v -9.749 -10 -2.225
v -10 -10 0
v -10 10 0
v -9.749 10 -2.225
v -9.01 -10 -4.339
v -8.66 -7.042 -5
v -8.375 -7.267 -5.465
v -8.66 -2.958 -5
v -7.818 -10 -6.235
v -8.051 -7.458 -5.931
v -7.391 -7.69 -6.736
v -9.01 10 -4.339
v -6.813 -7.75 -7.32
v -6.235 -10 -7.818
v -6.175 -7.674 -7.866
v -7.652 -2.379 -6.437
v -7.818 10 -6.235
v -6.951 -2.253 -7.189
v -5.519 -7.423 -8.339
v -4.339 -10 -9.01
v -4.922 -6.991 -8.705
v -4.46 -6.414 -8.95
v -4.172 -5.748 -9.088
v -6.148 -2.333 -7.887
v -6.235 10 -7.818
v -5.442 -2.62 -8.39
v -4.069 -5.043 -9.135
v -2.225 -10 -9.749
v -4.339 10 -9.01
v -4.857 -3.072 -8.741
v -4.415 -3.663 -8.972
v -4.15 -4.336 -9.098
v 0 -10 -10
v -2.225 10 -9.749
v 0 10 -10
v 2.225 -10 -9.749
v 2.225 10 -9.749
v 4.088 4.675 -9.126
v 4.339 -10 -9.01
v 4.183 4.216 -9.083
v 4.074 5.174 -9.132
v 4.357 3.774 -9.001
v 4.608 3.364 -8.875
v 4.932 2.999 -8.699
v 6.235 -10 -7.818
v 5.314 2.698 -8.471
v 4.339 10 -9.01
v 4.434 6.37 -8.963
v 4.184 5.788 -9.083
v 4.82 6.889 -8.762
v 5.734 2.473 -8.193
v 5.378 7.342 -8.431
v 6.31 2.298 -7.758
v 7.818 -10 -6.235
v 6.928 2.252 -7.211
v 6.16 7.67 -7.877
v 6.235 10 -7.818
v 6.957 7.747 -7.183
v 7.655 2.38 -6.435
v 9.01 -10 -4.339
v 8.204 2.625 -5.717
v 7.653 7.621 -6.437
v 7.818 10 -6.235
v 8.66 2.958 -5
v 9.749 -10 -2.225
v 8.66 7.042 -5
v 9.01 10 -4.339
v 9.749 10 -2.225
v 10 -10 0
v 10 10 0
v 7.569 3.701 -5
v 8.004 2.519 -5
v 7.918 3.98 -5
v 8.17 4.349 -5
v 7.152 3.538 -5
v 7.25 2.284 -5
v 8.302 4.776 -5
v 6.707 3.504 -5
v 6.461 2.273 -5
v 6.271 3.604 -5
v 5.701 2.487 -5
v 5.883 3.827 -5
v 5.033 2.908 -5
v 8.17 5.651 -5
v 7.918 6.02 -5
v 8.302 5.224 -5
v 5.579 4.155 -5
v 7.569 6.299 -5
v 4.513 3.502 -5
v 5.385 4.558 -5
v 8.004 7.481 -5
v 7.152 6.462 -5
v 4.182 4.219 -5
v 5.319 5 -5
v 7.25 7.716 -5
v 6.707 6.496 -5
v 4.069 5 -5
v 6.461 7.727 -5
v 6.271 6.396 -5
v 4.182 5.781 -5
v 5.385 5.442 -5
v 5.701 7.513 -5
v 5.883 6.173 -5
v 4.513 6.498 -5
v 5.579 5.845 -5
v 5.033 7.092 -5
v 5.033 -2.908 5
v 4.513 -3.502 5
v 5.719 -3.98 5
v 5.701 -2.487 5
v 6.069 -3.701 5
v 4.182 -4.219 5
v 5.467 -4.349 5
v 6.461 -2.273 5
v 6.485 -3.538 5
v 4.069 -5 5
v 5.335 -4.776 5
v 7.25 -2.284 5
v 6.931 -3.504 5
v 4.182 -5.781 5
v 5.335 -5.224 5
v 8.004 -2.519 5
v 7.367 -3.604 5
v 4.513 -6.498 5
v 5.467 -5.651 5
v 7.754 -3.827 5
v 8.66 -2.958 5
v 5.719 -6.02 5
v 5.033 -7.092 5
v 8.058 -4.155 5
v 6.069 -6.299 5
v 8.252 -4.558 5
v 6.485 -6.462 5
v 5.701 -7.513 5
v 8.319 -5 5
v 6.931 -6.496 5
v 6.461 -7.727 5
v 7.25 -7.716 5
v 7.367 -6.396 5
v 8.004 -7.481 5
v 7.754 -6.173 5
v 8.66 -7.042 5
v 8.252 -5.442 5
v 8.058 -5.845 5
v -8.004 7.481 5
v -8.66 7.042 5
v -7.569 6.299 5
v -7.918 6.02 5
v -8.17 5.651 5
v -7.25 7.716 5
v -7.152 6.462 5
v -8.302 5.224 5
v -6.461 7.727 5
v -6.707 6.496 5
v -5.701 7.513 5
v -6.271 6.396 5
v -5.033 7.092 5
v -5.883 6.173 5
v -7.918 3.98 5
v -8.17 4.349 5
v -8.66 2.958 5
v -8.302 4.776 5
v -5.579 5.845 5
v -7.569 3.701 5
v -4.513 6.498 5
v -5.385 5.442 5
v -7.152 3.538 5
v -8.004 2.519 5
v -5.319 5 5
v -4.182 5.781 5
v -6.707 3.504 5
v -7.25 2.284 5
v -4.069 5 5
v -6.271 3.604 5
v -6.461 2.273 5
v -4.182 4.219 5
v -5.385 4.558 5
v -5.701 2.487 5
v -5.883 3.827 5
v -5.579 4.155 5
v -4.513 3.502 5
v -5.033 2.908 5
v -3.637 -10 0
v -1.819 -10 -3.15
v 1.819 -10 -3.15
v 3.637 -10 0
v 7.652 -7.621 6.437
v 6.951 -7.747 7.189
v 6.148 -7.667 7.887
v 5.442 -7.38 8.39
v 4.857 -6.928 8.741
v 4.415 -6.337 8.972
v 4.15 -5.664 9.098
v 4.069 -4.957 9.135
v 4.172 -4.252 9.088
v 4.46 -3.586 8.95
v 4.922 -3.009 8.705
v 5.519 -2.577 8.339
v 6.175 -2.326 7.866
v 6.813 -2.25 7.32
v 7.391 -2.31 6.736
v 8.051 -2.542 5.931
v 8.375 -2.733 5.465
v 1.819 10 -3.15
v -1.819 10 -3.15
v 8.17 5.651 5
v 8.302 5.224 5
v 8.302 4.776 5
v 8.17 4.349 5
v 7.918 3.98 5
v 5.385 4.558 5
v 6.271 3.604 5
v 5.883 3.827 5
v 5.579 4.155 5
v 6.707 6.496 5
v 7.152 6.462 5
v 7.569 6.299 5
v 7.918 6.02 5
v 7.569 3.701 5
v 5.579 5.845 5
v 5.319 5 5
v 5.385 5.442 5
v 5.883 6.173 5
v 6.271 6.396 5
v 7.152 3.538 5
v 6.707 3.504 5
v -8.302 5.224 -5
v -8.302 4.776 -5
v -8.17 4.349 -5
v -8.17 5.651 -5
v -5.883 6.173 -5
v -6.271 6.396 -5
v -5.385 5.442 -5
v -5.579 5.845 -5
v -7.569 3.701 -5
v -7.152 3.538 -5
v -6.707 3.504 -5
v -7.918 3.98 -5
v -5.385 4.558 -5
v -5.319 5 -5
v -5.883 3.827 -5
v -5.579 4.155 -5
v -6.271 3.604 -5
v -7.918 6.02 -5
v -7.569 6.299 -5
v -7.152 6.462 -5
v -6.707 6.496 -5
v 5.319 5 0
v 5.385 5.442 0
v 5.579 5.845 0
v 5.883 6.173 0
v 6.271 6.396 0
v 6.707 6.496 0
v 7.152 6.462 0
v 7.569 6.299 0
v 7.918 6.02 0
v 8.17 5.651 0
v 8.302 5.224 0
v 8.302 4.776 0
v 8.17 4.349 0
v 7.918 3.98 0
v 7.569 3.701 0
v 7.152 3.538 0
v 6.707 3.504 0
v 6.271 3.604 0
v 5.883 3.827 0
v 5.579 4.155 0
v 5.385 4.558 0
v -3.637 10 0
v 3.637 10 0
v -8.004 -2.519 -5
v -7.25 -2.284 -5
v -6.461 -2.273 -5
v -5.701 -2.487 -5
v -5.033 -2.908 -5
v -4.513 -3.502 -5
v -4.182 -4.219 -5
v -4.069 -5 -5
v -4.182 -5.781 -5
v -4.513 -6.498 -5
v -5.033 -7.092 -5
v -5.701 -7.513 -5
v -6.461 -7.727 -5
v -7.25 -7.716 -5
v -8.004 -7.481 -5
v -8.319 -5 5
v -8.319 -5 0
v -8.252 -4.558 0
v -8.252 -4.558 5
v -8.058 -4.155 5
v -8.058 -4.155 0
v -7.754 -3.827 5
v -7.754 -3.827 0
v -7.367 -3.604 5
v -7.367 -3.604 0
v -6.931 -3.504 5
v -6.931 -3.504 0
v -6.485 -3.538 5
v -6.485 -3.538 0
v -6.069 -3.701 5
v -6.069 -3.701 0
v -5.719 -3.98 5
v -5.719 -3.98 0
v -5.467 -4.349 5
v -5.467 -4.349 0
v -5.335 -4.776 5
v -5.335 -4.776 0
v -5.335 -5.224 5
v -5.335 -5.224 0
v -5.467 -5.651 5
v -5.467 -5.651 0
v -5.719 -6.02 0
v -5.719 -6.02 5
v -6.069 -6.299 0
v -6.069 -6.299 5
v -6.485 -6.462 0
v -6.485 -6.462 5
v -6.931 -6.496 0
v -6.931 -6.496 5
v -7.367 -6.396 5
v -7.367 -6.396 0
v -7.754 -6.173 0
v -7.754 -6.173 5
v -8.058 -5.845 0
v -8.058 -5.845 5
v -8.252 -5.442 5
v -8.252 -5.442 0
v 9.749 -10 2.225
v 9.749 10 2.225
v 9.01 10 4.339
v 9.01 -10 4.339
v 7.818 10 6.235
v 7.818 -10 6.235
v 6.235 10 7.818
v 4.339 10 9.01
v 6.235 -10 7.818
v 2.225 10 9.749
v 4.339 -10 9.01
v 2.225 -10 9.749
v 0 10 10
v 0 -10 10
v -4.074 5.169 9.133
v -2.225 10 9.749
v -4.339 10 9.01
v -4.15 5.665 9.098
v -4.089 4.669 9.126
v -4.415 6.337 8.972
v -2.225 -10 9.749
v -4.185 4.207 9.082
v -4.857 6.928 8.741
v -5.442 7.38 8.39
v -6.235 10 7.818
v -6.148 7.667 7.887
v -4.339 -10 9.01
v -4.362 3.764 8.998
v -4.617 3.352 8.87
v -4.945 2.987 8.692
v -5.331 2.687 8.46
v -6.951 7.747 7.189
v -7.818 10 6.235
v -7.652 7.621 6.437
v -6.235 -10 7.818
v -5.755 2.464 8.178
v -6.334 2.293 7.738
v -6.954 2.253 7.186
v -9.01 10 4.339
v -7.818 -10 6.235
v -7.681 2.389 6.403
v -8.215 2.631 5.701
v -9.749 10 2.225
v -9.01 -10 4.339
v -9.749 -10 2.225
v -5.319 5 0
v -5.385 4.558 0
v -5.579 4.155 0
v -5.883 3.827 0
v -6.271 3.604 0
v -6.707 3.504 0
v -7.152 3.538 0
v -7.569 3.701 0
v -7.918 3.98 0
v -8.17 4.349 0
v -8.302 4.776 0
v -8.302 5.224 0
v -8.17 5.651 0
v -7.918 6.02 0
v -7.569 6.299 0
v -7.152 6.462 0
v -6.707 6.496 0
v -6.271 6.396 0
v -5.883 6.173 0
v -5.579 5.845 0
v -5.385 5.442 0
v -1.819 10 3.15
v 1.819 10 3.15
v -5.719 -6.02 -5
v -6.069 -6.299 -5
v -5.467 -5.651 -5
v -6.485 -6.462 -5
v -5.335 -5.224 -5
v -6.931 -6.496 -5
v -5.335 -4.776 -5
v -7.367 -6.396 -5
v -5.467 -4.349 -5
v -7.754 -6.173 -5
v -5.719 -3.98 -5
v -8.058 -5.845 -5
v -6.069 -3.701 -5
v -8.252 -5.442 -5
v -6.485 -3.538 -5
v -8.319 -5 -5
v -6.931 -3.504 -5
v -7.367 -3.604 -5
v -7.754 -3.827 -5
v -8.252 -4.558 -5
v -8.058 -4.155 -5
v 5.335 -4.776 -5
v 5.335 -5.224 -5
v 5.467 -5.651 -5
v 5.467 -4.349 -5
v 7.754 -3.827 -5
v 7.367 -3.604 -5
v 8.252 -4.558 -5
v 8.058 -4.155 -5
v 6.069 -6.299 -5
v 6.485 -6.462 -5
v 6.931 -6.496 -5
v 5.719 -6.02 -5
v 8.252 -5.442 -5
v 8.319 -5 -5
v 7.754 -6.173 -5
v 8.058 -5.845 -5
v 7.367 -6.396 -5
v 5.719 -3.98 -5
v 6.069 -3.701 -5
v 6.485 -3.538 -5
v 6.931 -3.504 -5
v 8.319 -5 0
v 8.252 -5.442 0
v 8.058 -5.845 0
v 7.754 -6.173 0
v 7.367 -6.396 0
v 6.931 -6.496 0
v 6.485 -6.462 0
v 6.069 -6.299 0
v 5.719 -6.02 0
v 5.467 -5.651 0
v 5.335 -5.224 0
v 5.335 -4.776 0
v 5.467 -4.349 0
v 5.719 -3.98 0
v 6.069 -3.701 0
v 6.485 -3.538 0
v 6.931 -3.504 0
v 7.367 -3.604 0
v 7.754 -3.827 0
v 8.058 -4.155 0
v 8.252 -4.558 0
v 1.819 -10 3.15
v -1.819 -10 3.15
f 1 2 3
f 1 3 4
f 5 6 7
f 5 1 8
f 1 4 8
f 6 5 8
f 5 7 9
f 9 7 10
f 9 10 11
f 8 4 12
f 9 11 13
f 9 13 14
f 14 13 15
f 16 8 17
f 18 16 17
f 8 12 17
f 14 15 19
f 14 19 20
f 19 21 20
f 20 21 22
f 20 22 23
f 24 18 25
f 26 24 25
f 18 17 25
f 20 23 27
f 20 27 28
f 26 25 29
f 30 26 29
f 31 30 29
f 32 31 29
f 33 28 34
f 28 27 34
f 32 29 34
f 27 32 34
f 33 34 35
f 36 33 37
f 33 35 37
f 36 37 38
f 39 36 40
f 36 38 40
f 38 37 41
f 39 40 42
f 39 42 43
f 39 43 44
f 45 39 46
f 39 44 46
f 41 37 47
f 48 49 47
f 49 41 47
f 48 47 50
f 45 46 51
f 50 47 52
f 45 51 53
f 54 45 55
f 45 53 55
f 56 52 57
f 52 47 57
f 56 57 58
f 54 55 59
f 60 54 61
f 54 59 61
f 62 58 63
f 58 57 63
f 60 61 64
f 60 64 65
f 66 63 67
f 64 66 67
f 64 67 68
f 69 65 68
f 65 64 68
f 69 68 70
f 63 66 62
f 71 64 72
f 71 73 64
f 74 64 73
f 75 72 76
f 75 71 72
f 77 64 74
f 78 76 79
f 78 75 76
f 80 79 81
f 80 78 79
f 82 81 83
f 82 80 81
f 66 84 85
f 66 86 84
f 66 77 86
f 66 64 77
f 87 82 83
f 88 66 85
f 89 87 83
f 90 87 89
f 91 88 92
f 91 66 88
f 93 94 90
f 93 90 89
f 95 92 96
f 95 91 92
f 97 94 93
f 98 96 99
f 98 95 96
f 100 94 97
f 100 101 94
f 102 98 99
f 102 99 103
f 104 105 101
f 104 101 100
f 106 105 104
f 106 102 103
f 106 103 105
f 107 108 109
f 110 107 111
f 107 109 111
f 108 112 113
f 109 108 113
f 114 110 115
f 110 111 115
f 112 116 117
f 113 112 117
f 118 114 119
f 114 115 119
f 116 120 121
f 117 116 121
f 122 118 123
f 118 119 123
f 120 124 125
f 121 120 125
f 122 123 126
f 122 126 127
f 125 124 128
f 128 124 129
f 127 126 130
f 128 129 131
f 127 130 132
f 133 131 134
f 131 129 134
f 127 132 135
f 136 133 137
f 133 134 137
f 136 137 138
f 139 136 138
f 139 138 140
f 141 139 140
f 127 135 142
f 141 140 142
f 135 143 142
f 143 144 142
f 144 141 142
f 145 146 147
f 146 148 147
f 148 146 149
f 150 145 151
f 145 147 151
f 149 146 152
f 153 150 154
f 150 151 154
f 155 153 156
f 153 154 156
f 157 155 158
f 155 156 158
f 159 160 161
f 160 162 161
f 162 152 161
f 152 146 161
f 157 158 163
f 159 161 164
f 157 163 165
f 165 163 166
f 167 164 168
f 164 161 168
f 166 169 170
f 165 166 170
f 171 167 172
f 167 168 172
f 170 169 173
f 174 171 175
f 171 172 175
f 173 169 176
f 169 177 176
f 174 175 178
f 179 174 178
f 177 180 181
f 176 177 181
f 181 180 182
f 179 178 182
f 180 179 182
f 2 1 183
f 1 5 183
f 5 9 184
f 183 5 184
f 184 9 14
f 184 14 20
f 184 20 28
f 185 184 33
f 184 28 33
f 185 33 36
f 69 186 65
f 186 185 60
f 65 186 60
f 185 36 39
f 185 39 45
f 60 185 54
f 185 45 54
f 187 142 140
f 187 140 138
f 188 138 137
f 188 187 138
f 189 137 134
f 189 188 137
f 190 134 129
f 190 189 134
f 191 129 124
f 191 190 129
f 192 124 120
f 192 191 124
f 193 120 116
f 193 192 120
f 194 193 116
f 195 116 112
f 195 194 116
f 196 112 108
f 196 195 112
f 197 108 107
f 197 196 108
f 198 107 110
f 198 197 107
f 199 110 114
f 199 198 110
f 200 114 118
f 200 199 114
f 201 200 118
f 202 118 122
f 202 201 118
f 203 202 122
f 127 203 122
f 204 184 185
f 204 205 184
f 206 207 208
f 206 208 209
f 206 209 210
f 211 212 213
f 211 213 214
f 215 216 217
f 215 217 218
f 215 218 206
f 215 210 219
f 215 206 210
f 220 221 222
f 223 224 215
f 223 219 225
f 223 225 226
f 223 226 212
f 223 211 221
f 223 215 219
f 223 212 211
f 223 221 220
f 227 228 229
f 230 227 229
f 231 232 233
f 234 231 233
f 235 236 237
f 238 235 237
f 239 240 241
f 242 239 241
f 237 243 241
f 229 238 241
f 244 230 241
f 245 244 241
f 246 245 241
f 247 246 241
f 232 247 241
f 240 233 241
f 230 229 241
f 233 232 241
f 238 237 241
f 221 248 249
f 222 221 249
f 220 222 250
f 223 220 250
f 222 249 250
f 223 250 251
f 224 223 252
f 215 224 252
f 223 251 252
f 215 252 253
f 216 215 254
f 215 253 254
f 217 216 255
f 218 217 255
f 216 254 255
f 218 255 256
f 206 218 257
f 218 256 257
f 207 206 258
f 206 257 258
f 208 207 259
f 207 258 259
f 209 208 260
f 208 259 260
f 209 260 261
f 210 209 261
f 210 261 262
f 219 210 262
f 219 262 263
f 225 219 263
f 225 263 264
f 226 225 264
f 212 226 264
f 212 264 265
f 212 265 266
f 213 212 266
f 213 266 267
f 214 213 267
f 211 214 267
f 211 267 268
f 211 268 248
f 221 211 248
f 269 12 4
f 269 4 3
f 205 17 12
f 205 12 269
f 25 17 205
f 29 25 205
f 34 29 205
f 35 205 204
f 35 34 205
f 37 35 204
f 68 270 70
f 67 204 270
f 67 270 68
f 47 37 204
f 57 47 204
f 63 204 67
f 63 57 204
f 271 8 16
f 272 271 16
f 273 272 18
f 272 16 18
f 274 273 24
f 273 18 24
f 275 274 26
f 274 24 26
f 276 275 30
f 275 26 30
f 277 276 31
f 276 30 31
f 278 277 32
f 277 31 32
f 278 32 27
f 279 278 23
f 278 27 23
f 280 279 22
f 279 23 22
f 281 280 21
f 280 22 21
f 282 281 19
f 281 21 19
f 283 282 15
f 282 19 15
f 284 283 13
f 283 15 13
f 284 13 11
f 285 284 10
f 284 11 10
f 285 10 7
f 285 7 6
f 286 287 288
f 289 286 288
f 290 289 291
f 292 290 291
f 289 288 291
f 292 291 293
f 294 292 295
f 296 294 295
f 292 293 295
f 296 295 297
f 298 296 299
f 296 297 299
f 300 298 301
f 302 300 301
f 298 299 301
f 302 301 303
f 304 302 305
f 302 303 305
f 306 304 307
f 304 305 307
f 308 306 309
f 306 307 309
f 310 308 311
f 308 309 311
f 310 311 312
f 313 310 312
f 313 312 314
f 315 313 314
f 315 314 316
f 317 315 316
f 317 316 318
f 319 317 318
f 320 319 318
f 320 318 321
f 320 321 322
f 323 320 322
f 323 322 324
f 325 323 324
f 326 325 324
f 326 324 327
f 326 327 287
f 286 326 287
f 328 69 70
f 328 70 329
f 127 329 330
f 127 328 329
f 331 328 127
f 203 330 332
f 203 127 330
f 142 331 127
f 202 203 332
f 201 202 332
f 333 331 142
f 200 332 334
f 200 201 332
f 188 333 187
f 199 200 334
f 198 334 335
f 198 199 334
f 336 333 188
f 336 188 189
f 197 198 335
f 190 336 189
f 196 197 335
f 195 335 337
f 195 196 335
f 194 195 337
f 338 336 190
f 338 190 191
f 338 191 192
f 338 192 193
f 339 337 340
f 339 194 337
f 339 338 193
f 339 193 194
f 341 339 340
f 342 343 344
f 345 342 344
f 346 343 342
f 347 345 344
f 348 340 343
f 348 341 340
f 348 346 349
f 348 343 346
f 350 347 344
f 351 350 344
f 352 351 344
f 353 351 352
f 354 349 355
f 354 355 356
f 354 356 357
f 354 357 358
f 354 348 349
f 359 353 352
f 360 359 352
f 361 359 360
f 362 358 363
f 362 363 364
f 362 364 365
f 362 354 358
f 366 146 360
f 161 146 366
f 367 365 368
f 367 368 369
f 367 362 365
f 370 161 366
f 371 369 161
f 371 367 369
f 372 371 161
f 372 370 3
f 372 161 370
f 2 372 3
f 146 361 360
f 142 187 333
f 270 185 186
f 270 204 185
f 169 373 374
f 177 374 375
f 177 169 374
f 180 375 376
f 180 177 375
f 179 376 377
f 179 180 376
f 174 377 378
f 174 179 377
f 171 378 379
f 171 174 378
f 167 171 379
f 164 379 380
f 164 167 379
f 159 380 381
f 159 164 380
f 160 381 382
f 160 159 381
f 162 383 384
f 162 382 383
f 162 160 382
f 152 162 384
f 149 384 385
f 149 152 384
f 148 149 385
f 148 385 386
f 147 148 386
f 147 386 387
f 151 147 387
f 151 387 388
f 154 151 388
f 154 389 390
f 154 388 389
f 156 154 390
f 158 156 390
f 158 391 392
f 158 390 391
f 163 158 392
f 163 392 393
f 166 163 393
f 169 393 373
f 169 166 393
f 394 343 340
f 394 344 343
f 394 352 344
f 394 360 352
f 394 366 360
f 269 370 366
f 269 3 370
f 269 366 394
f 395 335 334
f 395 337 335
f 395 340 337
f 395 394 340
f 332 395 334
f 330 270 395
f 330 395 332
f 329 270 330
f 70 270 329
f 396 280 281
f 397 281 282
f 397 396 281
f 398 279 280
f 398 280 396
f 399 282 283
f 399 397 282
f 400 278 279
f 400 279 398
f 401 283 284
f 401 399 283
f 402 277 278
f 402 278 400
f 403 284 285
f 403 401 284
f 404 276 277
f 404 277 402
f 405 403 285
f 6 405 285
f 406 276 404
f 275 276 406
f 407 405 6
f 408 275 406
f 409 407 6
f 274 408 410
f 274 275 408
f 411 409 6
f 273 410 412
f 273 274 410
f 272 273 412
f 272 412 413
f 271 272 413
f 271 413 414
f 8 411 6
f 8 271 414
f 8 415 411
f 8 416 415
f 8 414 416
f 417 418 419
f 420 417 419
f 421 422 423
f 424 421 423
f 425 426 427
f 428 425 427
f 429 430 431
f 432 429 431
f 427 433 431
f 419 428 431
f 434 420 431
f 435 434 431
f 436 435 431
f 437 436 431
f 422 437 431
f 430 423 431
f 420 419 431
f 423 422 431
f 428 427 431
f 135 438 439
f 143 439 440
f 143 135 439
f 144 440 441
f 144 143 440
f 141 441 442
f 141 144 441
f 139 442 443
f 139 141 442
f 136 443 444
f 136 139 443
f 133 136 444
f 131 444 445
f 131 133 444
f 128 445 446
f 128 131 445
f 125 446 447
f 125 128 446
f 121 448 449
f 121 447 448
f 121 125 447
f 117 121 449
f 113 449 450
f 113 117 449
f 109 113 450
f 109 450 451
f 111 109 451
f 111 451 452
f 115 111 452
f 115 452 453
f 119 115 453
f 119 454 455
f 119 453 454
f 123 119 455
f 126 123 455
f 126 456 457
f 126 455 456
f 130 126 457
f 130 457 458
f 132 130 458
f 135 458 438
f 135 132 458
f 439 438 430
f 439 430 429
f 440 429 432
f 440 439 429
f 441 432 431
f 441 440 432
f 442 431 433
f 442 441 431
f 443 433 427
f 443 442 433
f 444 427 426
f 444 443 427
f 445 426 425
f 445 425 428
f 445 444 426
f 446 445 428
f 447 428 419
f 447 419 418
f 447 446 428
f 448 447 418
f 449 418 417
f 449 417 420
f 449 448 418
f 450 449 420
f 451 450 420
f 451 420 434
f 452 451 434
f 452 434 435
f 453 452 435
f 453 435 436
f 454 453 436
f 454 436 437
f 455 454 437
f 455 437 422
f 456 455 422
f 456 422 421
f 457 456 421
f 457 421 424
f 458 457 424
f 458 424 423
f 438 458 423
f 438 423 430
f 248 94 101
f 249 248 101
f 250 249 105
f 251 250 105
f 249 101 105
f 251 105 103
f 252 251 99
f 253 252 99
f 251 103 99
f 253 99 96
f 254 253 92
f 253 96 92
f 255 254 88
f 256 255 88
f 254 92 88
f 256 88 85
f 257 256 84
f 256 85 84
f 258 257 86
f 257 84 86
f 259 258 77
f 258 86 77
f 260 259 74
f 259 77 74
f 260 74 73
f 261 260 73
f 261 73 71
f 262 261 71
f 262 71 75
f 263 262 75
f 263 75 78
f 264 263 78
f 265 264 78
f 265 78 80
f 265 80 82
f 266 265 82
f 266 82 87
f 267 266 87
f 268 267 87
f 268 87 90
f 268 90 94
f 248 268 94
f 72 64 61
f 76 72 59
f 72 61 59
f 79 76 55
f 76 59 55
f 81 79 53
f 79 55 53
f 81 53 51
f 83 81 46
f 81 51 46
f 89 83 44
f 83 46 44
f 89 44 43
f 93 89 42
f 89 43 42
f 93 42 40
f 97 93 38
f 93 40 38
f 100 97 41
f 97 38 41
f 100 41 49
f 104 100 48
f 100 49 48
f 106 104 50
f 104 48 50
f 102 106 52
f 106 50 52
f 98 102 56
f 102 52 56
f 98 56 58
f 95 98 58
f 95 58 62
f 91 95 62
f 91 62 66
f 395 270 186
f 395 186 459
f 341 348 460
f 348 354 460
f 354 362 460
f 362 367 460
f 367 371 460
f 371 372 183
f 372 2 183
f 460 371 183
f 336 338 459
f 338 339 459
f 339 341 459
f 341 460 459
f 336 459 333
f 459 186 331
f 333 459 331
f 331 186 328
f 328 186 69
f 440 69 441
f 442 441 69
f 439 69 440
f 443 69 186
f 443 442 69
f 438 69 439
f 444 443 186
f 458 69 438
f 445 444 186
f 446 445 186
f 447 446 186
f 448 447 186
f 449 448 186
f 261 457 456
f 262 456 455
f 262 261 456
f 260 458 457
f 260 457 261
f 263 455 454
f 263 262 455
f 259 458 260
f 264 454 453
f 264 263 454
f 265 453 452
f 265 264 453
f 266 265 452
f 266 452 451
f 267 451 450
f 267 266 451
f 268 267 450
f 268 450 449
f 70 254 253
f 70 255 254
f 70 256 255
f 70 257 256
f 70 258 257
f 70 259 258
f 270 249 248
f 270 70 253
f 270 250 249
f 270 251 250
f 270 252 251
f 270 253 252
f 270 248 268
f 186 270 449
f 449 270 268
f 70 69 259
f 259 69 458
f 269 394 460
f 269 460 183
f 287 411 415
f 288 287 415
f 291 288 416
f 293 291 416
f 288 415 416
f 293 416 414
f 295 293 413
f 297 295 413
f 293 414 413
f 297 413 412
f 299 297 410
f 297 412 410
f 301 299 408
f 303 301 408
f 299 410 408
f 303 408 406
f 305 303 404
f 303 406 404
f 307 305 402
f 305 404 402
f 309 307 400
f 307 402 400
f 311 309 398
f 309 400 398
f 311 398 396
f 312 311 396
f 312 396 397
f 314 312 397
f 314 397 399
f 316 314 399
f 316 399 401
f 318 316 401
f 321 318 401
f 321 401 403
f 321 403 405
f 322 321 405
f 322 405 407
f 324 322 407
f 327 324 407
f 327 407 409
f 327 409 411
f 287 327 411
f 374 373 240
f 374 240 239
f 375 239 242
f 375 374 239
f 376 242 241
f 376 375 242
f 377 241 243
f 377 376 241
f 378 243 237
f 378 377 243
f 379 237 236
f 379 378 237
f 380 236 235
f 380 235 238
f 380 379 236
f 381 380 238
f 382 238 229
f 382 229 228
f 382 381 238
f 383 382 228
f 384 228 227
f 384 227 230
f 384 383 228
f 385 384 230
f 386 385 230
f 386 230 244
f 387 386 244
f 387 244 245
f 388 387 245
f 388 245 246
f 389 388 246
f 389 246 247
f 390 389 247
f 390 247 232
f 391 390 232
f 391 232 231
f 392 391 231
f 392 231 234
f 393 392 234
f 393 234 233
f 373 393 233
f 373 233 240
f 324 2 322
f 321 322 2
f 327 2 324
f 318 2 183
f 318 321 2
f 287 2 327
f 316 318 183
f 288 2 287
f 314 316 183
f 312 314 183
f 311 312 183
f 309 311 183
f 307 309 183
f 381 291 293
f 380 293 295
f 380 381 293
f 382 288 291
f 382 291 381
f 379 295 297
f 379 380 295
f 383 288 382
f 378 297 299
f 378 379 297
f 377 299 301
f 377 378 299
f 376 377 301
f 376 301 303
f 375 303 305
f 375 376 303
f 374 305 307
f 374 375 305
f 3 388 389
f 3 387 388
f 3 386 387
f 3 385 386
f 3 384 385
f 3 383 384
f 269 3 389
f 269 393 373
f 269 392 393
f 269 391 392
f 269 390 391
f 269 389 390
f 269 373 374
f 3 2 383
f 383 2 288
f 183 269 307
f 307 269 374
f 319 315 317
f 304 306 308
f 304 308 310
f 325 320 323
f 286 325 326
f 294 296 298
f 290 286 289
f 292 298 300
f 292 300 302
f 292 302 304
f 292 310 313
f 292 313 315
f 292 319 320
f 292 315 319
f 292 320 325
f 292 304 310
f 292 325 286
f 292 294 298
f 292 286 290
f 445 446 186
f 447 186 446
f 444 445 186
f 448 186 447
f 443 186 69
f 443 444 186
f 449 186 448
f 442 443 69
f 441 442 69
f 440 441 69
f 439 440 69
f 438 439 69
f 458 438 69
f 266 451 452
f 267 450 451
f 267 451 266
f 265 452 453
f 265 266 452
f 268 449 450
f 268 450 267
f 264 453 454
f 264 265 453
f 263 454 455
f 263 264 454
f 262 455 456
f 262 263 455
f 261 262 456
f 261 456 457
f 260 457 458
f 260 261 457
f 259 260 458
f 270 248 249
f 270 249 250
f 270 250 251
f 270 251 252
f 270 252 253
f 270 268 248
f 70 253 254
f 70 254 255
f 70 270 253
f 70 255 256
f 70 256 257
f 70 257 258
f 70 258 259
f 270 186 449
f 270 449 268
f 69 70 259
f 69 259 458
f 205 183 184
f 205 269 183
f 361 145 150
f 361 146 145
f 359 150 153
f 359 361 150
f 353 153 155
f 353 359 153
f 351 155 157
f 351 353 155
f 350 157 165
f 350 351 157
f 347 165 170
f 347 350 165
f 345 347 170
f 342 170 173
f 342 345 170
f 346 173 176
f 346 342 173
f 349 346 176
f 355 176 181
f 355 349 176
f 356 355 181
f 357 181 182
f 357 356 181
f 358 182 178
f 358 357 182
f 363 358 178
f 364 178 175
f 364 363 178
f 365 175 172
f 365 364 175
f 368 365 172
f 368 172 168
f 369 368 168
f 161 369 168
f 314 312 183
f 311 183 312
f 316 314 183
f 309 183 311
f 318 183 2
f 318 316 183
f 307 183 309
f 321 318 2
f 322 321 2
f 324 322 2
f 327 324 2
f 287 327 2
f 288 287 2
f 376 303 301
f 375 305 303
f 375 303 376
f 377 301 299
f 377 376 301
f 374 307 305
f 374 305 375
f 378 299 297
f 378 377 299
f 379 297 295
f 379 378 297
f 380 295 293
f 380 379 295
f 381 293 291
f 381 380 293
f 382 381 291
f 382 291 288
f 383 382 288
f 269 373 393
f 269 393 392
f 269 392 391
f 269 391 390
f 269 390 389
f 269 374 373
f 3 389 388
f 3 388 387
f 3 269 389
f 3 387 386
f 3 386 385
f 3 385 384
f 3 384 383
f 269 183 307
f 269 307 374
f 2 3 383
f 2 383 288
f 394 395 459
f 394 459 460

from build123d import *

# Parameters (mm, degrees)
BOSS_EXTRUDE1_DEPTH = 10
BOSS_EXTRUDE2_DEPTH = 10
SKETCH2_R           = 1.4999999999999998
CUT_EXTRUDE4_DEPTH  = 15
SKETCH2_5_R         = 2.75
SKETCH2_5_R_2       = 1.4999999999999998
CUT_EXTRUDE10_DEPTH = 5
CUT_EXTRUDE13_START = -20
SKETCH2_9_R         = 1.4999999999999998
CUT_EXTRUDE13_DEPTH = 15
CUT_EXTRUDE11_START = -20
SKETCH2_6_R         = 2.75
SKETCH2_6_R_2       = 1.4999999999999998
CUT_EXTRUDE11_DEPTH = 5
SKETCH1_5_W         = 20
SKETCH1_5_H         = 20
CUT_EXTRUDE9_DEPTH  = 10


with BuildPart() as part:
    # Sketch1 → Boss-Extrude1 (new, symmetric)
    with BuildSketch(Plane(origin=(0, 0, 0), x_dir=(1, 0, 0), z_dir=(0, 1, 0))):
        with BuildLine():
            Line((1.8186533479473221, 3.150000000000001), (3.6373066958946447, 0))
            Line((3.6373066958946447, 0), (10, 0))
            ThreePointArc((10, 0), (7.071067802431099, 7.0710678212998515), (-2.668444515e-08, 10))
            ThreePointArc((-2.668444515e-08, 10), (-7.071067821299852, 7.071067802431098), (-10, 1.22e-15))
            Line((-10, 0), (-3.637306695894643, 8.7e-16))
            Line((-3.637306695894643, 8.9e-16), (-1.8186533479473208, 3.1500000000000012))
            Line((-1.8186533479473206, 3.1500000000000012), (1.8186533479473224, 3.150000000000001))
        make_face()
        with BuildLine():
            ThreePointArc((-2.668444515e-08, 10), (7.071067802431099, 7.0710678212998515), (10, 0))
            Line((10, 0), (10, 10))
            Line((10, 10), (-2.668444488e-08, 10))
        make_face()
        with BuildLine():
            ThreePointArc((-10, 1.22e-15), (-7.071067821299852, 7.071067802431098), (-2.668444515e-08, 10))
            Line((-2.668444488e-08, 10), (-10, 10))
            Line((-10, 10), (-10, 0))
        make_face()
    extrude(amount=BOSS_EXTRUDE1_DEPTH, both=True)


with BuildPart() as body_2:
    # Sketch1<3> → Boss-Extrude2 (new, symmetric)
    with BuildSketch(Plane(origin=(0, 0, 0), x_dir=(1, 0, 0), z_dir=(0, 1, 0))):
        with BuildLine():
            Line((10, 0), (3.6373066958946447, 0))
            Line((3.6373066958946447, 0), (1.8186533479473237, -3.15))
            Line((1.8186533479473235, -3.15), (-1.8186533479473204, -3.15))
            Line((-1.8186533479473204, -3.15), (-3.637306695894643, 8.7e-16))
            Line((-3.637306695894643, 8.7e-16), (-10, 0))
            ThreePointArc((-10, 1.22e-15), (-7.071067811865477, -7.071067811865475), (-1.84e-15, -10))
            ThreePointArc((-1.84e-15, -10), (7.071067811865474, -7.071067811865477), (10, -2.45e-15))
        make_face()
        with BuildLine():
            Line((10, -10), (10, 0))
            ThreePointArc((10, -2.45e-15), (7.071067811865474, -7.071067811865477), (-1.84e-15, -10))
            Line((-1.78e-15, -10), (10, -10))
        make_face()
        with BuildLine():
            Line((-10, -10), (-1.78e-15, -10))
            ThreePointArc((-1.84e-15, -10), (-7.071067811865477, -7.071067811865475), (-10, 1.22e-15))
            Line((-10, 0), (-10, -10))
        make_face()
    extrude(amount=BOSS_EXTRUDE2_DEPTH, both=True)


with BuildPart() as cut_extrude4_tool:
    # Sketch2 → Cut-Extrude4 (new body)
    with BuildSketch(Plane(origin=(0, 0, -10), x_dir=(-1, 0, 0), z_dir=(0, 0, -1))):
        with Locations((-6.818653347947323, 5)):
            Circle(SKETCH2_R)
        with Locations((6.818653347947323, -5)):
            Circle(SKETCH2_R)
    extrude(amount=-CUT_EXTRUDE4_DEPTH)


with BuildPart() as part_1:
    add(part.part)

    # Cut-Extrude4: cut by cut_extrude4_tool
    add(cut_extrude4_tool.part, mode=Mode.SUBTRACT)

    # Sketch2<5> → Cut-Extrude10 (cut)
    # profile 1 of 2: a face of its own
    with BuildSketch(Plane(origin=(0, 0, -10), x_dir=(-1, 0, 0), z_dir=(0, 0, -1))):
        with Locations((-6.818653347947323, 5)):
            Circle(SKETCH2_5_R)
        with Locations((-6.818653347947323, 5)):
            Circle(SKETCH2_5_R_2, mode=Mode.SUBTRACT)
    # profile 2 of 2: a face of its own
    with BuildSketch(Plane(origin=(0, 0, -10), x_dir=(-1, 0, 0), z_dir=(0, 0, -1))):
        with Locations((6.818653347947323, -5)):
            Circle(SKETCH2_5_R)
        with Locations((6.818653347947323, -5)):
            Circle(SKETCH2_5_R_2, mode=Mode.SUBTRACT)
    extrude(amount=-CUT_EXTRUDE10_DEPTH, mode=Mode.SUBTRACT)


with BuildPart() as body_2_1:
    add(body_2.part)

    # Cut-Extrude4: cut by cut_extrude4_tool
    add(cut_extrude4_tool.part, mode=Mode.SUBTRACT)


with BuildPart() as cut_extrude13_tool:
    # Sketch2<9> → Cut-Extrude13 (new body)
    with BuildSketch(Plane(origin=(0, 0, -10), x_dir=(-1, 0, 0), z_dir=(0, 0, -1)).offset(CUT_EXTRUDE13_START)):
        with Locations(Location((6.818653347947323, 5, 0), (0, 0, 180))):
            Circle(SKETCH2_9_R)
        with Locations(Location((-6.818653347947323, -5, 0), (0, 0, 180))):
            Circle(SKETCH2_9_R)
    extrude(amount=CUT_EXTRUDE13_DEPTH)


with BuildPart() as part_2:
    add(part_1.part)

    # Cut-Extrude13: cut by cut_extrude13_tool
    add(cut_extrude13_tool.part, mode=Mode.SUBTRACT)


with BuildPart() as body_2_2:
    add(body_2_1.part)

    # Cut-Extrude13: cut by cut_extrude13_tool
    add(cut_extrude13_tool.part, mode=Mode.SUBTRACT)

    # Sketch2<6> → Cut-Extrude11 (cut)
    # profile 1 of 2: a face of its own
    with BuildSketch(Plane(origin=(0, 0, -10), x_dir=(-1, 0, 0), z_dir=(0, 0, -1)).offset(CUT_EXTRUDE11_START)):
        with Locations(Location((-6.818653347947323, -5, 0), (0, 0, 180))):
            Circle(SKETCH2_6_R)
        with Locations(Location((-6.818653347947323, -5, 0), (0, 0, 180))):
            Circle(SKETCH2_6_R_2, mode=Mode.SUBTRACT)
    # profile 2 of 2: a face of its own
    with BuildSketch(Plane(origin=(0, 0, -10), x_dir=(-1, 0, 0), z_dir=(0, 0, -1)).offset(CUT_EXTRUDE11_START)):
        with Locations(Location((6.818653347947323, 5, 0), (0, 0, 180))):
            Circle(SKETCH2_6_R)
        with Locations(Location((6.818653347947323, 5, 0), (0, 0, 180))):
            Circle(SKETCH2_6_R_2, mode=Mode.SUBTRACT)
    extrude(amount=CUT_EXTRUDE11_DEPTH, mode=Mode.SUBTRACT)


with BuildPart() as cut_extrude9_tool:
    # Sketch1<5> → Cut-Extrude9 (new, symmetric)
    # profile 1 of 5: a face of its own
    with BuildSketch(Plane(origin=(0, 0, 0), x_dir=(1, 0, 0), z_dir=(0, 1, 0))):
        Polygon((20, 20), (20, -19.999999999999996), (-19.999999999999996, -20), (-20, 20), align=None)
        Rectangle(SKETCH1_5_W, SKETCH1_5_H, mode=Mode.SUBTRACT)
    # profile 2 of 5: a face of its own
    with BuildSketch(Plane(origin=(0, 0, 0), x_dir=(1, 0, 0), z_dir=(0, 1, 0))):
        with BuildLine():
            ThreePointArc((-10, 1.22e-15), (-7.071067821299852, 7.071067802431098), (-2.668444515e-08, 10))
            Line((-2.668444488e-08, 10), (-10, 10))
            Line((-10, 10), (-10, 0))
        make_face()
    # profile 3 of 5: a face of its own
    with BuildSketch(Plane(origin=(0, 0, 0), x_dir=(1, 0, 0), z_dir=(0, 1, 0))):
        with BuildLine():
            ThreePointArc((-2.668444515e-08, 10), (7.071067802431099, 7.0710678212998515), (10, 0))
            Line((10, 0), (10, 10))
            Line((10, 10), (-2.668444488e-08, 10))
        make_face()
    # profile 4 of 5: a face of its own
    with BuildSketch(Plane(origin=(0, 0, 0), x_dir=(1, 0, 0), z_dir=(0, 1, 0))):
        with BuildLine():
            Line((10, -10), (10, 0))
            ThreePointArc((10, -2.45e-15), (7.071067811865474, -7.071067811865477), (-1.84e-15, -10))
            Line((-1.78e-15, -10), (10, -10))
        make_face()
    # profile 5 of 5: a face of its own
    with BuildSketch(Plane(origin=(0, 0, 0), x_dir=(1, 0, 0), z_dir=(0, 1, 0))):
        with BuildLine():
            Line((-10, -10), (-1.78e-15, -10))
            ThreePointArc((-1.84e-15, -10), (-7.071067811865477, -7.071067811865475), (-10, 1.22e-15))
            Line((-10, 0), (-10, -10))
        make_face()
    extrude(amount=CUT_EXTRUDE9_DEPTH, both=True)


with BuildPart() as part_3:
    add(part_2.part)

    # Cut-Extrude9: cut by cut_extrude9_tool
    add(cut_extrude9_tool.part, mode=Mode.SUBTRACT)


with BuildPart() as body_2_3:
    add(body_2_2.part)

    # Cut-Extrude9: cut by cut_extrude9_tool
    add(cut_extrude9_tool.part, mode=Mode.SUBTRACT)


solid = Compound([part_3.part, body_2_3.part])
